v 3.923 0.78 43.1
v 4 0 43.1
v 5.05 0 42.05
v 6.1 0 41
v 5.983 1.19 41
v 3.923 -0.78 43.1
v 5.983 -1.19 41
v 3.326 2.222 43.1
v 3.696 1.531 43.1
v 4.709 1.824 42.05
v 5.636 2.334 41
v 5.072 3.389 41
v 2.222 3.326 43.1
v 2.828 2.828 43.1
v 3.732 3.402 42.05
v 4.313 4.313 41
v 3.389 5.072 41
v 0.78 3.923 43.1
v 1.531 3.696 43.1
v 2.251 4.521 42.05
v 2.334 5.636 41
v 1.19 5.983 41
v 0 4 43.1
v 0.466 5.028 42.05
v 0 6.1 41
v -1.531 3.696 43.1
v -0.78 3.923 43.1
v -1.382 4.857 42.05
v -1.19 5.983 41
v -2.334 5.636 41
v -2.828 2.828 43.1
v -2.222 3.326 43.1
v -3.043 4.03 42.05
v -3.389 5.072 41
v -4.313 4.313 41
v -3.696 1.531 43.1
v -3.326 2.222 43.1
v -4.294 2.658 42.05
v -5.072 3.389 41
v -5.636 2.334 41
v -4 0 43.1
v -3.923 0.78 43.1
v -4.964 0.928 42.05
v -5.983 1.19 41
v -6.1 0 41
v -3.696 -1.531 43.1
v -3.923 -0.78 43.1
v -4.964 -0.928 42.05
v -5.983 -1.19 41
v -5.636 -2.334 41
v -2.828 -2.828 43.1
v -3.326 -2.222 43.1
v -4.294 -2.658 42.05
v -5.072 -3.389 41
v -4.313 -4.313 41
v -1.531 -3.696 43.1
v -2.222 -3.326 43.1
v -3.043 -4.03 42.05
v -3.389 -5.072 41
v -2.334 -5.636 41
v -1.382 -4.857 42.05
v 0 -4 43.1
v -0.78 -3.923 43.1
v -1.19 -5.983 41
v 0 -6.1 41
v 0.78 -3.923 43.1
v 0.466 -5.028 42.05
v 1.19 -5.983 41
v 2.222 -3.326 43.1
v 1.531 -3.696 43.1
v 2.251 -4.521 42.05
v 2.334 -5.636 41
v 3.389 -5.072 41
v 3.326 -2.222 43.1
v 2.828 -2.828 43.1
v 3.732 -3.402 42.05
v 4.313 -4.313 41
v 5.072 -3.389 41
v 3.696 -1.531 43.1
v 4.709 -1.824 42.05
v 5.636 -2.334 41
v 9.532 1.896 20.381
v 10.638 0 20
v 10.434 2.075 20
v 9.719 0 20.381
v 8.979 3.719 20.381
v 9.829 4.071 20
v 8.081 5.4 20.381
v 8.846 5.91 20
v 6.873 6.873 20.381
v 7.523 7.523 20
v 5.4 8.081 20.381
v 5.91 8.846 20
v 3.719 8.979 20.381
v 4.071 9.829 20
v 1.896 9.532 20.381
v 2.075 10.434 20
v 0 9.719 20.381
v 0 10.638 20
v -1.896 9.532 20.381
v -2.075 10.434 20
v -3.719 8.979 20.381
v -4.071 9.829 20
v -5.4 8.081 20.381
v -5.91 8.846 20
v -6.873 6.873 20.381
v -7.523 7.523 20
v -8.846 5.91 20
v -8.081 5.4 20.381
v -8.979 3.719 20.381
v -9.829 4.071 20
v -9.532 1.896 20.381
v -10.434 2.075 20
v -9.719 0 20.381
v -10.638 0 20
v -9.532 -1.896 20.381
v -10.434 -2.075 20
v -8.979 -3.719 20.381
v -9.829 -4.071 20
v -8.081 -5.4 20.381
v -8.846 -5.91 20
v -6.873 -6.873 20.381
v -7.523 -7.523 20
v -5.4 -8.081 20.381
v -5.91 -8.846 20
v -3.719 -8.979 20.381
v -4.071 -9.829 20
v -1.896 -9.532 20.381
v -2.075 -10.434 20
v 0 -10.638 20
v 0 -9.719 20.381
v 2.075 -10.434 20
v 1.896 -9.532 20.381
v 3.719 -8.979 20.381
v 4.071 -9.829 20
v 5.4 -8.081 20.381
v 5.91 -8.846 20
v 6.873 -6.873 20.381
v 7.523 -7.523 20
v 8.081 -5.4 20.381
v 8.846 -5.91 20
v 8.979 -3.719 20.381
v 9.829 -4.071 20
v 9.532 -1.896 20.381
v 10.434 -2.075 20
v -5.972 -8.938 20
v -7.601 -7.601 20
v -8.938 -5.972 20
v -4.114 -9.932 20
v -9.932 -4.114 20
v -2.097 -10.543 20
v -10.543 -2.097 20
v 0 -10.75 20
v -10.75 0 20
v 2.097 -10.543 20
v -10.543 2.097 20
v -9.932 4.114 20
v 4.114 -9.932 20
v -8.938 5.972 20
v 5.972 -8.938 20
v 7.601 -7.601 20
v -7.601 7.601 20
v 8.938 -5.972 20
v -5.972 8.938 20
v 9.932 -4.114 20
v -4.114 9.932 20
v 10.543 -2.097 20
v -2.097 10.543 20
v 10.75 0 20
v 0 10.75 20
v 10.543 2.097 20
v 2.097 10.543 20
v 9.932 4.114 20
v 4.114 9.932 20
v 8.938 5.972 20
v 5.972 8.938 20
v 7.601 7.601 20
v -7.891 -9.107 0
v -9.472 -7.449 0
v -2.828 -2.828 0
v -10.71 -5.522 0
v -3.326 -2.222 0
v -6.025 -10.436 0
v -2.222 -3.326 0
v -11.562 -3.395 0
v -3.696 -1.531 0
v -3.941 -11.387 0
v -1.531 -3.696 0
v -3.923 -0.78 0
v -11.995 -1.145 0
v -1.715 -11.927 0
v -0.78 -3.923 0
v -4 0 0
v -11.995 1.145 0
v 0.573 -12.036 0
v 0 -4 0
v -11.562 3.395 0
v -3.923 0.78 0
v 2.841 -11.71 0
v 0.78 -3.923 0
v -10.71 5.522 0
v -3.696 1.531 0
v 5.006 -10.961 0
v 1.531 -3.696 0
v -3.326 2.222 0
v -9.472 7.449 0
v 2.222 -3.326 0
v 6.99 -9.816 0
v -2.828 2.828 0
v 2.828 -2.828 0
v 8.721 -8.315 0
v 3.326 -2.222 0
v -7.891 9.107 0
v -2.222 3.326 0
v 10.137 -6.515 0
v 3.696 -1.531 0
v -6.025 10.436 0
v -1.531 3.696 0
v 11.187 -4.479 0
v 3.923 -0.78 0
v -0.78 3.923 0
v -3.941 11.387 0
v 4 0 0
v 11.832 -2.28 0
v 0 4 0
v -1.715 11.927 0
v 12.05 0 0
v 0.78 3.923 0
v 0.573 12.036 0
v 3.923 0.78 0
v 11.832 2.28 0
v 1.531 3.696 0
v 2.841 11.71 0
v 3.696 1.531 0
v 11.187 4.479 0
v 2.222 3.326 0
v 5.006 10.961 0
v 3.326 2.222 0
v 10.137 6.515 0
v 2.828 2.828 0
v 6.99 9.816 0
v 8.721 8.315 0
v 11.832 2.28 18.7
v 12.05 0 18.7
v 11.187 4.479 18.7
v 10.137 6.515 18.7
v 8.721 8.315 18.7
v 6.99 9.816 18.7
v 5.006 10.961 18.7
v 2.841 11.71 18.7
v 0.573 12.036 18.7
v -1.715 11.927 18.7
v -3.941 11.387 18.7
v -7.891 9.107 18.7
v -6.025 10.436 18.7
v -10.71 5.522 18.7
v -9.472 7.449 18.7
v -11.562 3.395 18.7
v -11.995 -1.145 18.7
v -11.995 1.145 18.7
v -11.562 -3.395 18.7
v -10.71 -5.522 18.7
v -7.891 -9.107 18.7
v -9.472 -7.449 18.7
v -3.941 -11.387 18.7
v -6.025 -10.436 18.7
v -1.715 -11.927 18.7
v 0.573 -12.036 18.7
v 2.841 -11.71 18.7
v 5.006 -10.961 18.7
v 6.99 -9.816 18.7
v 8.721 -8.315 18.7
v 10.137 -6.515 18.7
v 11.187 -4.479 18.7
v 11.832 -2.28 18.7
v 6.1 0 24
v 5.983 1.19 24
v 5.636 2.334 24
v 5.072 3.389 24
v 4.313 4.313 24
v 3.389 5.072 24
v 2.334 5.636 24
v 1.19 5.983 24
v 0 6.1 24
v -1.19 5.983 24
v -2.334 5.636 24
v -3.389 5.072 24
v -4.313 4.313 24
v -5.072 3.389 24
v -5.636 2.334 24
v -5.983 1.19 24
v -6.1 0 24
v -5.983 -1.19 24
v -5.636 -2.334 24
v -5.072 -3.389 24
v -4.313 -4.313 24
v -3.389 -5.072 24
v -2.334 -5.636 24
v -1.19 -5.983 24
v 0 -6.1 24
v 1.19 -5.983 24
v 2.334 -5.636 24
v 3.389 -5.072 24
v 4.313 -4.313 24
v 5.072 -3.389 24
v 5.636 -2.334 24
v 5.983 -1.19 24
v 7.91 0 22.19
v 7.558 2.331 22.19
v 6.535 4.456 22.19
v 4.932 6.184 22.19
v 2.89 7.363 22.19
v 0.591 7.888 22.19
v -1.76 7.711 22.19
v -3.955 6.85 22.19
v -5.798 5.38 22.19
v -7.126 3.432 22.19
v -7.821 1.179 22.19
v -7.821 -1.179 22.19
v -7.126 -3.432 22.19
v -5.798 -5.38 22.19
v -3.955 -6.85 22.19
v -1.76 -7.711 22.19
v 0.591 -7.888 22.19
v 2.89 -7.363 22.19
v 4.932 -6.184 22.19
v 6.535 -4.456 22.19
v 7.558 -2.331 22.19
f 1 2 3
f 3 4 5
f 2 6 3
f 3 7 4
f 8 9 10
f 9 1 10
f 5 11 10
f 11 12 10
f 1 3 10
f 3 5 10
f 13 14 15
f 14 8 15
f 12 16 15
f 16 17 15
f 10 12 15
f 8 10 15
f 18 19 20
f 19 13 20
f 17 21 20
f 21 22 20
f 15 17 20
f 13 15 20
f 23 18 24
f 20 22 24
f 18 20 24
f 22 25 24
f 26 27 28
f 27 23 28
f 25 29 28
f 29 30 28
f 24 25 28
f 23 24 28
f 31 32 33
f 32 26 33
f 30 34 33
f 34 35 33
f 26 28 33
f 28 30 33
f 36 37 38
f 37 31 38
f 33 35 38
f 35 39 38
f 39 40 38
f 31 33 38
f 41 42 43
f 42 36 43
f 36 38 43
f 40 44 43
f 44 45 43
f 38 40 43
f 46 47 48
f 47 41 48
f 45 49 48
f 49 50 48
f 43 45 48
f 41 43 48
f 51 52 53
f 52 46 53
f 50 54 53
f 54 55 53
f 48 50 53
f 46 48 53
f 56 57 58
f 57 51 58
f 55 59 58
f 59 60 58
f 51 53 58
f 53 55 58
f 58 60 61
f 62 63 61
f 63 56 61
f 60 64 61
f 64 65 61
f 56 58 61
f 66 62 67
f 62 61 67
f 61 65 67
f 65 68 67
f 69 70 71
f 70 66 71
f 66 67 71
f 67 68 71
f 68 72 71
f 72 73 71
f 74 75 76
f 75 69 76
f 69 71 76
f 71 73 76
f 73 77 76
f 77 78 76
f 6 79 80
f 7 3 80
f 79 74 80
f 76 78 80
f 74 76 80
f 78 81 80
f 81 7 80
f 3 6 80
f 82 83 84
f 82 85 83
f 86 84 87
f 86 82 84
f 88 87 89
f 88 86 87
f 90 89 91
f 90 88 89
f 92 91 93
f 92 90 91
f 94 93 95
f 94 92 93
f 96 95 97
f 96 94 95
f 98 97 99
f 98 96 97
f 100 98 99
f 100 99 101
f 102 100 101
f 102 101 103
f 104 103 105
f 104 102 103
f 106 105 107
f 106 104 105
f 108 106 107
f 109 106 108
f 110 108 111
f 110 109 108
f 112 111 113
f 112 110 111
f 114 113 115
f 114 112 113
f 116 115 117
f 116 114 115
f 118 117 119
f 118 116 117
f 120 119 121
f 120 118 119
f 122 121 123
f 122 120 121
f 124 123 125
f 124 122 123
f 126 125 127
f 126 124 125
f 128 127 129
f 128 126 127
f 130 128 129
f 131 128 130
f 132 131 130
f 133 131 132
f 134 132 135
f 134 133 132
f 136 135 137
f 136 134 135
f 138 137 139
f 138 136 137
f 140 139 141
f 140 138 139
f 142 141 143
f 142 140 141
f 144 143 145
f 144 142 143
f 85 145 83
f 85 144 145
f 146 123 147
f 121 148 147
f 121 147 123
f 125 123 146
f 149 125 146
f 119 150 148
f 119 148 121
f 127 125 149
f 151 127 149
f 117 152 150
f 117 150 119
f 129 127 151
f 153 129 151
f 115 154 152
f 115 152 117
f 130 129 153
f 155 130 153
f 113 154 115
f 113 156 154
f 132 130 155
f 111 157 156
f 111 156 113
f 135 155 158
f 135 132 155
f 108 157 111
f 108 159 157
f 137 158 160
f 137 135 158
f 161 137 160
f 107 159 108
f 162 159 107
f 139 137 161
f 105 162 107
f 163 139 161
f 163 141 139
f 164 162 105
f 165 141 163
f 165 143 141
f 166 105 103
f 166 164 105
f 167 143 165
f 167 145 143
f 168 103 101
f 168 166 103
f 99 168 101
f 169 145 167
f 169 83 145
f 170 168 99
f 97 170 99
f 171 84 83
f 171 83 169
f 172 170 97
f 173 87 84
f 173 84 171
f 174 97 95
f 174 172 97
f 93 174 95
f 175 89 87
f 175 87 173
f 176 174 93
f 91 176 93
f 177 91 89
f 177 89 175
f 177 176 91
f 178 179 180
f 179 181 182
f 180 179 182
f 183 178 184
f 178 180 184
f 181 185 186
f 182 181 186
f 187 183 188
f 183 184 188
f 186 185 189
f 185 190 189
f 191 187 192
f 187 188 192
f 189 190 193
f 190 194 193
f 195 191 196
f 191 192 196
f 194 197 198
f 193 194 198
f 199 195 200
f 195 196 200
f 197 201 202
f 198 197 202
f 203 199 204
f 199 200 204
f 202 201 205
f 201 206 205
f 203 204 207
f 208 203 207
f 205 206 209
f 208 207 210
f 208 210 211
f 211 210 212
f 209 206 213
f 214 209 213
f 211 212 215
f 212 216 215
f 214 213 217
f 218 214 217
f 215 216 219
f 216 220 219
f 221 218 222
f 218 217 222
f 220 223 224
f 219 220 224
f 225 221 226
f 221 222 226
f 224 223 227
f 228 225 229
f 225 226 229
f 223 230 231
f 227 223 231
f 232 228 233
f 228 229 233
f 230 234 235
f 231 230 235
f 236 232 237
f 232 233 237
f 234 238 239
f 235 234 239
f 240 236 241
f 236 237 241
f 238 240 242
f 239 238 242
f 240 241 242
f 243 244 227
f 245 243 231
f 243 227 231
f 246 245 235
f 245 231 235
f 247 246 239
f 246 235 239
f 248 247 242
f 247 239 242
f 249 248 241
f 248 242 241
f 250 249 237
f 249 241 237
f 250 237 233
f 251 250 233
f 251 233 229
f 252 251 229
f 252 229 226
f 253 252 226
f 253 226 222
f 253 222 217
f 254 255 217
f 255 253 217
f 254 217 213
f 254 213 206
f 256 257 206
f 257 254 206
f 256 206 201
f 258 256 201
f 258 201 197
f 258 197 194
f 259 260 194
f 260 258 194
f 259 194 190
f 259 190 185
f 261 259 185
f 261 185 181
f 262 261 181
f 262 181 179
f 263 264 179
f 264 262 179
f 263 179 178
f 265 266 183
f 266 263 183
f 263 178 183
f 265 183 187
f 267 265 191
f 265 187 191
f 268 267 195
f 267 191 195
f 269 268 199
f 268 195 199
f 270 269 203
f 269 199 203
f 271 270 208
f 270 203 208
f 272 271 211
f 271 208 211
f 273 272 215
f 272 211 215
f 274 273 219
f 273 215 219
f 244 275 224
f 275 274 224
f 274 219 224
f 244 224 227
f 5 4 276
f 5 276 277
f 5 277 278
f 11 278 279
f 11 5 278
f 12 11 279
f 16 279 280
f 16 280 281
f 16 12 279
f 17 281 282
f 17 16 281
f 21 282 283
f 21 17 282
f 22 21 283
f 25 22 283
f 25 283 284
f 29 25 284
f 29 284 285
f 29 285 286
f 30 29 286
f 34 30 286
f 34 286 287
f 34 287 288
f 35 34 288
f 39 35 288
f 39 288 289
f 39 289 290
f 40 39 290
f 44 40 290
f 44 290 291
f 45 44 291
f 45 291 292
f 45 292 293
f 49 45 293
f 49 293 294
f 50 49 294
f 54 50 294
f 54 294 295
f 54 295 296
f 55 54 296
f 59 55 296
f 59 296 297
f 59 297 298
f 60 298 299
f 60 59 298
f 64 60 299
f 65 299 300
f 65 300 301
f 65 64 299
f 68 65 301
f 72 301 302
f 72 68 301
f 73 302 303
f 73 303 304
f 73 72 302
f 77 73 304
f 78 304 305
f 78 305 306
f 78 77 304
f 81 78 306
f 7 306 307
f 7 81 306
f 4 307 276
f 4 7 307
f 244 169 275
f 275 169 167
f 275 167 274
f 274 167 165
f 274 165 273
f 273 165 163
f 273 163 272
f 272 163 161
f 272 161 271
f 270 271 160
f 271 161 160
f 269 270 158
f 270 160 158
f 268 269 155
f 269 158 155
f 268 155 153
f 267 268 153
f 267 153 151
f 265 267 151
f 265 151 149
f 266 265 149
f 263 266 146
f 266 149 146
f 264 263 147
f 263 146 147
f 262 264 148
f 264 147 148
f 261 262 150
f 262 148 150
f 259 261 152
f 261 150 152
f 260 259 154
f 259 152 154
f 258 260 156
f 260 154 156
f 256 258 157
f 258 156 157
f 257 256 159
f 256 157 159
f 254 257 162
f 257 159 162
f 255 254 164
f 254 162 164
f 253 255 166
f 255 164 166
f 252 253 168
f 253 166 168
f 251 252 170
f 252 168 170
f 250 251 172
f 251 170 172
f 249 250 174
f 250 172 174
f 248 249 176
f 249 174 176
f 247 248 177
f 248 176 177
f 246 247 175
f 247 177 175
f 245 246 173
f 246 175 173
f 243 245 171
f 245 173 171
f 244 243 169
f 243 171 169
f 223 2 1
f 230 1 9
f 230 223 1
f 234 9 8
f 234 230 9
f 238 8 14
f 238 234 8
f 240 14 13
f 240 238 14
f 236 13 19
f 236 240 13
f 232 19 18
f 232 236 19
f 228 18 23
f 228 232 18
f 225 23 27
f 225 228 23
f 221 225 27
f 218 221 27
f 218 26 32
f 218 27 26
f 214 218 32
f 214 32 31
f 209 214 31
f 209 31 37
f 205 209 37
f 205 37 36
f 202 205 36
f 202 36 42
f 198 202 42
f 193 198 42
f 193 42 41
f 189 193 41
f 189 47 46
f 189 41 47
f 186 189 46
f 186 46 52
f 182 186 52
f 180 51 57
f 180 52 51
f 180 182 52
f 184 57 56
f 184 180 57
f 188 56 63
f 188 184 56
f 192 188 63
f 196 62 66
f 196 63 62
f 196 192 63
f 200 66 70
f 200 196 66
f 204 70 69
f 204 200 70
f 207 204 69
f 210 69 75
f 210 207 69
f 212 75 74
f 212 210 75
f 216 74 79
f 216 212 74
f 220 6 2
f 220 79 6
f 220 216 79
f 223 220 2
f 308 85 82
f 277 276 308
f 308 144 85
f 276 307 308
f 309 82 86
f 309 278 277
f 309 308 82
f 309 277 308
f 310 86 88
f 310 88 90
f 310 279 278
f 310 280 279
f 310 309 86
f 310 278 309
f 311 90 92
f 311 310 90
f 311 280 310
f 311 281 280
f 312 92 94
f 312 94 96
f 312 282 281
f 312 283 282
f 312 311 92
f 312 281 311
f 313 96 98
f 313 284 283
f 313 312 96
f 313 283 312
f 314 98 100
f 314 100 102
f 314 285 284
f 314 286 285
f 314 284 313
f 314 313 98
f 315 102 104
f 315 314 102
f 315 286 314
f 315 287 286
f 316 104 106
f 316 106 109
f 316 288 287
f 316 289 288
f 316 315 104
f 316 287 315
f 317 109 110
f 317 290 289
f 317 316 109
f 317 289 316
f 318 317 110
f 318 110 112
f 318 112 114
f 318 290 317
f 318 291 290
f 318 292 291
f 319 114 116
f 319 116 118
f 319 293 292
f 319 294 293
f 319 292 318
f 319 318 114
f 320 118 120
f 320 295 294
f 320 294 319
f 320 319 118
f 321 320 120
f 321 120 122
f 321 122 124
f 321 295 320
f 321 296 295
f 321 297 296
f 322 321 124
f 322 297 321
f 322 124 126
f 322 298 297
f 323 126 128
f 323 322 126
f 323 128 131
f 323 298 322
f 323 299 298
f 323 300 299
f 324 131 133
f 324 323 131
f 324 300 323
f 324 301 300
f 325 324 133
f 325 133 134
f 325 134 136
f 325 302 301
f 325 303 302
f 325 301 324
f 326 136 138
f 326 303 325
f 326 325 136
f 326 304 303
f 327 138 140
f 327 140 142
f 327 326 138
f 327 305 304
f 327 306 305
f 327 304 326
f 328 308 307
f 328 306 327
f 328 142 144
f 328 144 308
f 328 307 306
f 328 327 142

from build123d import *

# Parameters (mm, degrees)
F0_R     = 12.05
F0_R_2   = 4
F1_DEPTH = 45
F2_R     = 13.7736211886
F2_R_2   = 6.1
F3_DEPTH = 25


# Not quite as in the source:
# - a fillet or chamfer that OpenCascade refuses, or shapes differently, is made with other operations: its cross-section is extruded or revolved along the edge and cut away or added


with BuildPart() as f1:
    # F0 (on Top) → F1 (new body)
    with BuildSketch(Plane.XY):
        Circle(F0_R)
        Circle(F0_R_2, mode=Mode.SUBTRACT)
    extrude(amount=F1_DEPTH)

    # F2 (on face) → F3 (cut)
    with BuildSketch(Plane.XY.offset(45)):
        Circle(F2_R)
        Circle(F2_R_2, mode=Mode.SUBTRACT)
    extrude(amount=-F3_DEPTH, mode=Mode.SUBTRACT)

    # F4: chamfer of 4 on 3 edges, made by hand

    # F4_s1 → F4_t2 (revolve)
    with BuildSketch(Plane.XZ):
        Polygon((10.1, 20), (6.1, 24), (6.1, 20), align=None)
    revolve(axis=Axis((0, 0, 20), (0, 0, 1)))

    # F4_s3 → F4_t4 (revolve, cut)
    with BuildSketch(Plane.XZ):
        Polygon((2.1, 45), (6.1, 41), (6.1, 45), align=None)
    revolve(axis=Axis((0, 0, 45), (0, 0, 1)), mode=Mode.SUBTRACT)

    # F5: chamfer of 1.3 on 2 edges, made by hand

    # F5_s1 → F5_t2 (revolve)
    with BuildSketch(Plane.XZ):
        Polygon((10.6384776311, 20), (9.7192388155, 20.3807611845), (10.1, 20), align=None)
    revolve(axis=Axis((0, 0, 20), (0, 0, 1)))

    # F5_s3 → F5_t4 (revolve, cut)
    with BuildSketch(Plane.XZ):
        Polygon((12.05, 18.7), (10.75, 20), (12.05, 20), align=None)
    revolve(axis=Axis((0, 0, 20), (0, 0, -1)), mode=Mode.SUBTRACT)


solid = f1.part
